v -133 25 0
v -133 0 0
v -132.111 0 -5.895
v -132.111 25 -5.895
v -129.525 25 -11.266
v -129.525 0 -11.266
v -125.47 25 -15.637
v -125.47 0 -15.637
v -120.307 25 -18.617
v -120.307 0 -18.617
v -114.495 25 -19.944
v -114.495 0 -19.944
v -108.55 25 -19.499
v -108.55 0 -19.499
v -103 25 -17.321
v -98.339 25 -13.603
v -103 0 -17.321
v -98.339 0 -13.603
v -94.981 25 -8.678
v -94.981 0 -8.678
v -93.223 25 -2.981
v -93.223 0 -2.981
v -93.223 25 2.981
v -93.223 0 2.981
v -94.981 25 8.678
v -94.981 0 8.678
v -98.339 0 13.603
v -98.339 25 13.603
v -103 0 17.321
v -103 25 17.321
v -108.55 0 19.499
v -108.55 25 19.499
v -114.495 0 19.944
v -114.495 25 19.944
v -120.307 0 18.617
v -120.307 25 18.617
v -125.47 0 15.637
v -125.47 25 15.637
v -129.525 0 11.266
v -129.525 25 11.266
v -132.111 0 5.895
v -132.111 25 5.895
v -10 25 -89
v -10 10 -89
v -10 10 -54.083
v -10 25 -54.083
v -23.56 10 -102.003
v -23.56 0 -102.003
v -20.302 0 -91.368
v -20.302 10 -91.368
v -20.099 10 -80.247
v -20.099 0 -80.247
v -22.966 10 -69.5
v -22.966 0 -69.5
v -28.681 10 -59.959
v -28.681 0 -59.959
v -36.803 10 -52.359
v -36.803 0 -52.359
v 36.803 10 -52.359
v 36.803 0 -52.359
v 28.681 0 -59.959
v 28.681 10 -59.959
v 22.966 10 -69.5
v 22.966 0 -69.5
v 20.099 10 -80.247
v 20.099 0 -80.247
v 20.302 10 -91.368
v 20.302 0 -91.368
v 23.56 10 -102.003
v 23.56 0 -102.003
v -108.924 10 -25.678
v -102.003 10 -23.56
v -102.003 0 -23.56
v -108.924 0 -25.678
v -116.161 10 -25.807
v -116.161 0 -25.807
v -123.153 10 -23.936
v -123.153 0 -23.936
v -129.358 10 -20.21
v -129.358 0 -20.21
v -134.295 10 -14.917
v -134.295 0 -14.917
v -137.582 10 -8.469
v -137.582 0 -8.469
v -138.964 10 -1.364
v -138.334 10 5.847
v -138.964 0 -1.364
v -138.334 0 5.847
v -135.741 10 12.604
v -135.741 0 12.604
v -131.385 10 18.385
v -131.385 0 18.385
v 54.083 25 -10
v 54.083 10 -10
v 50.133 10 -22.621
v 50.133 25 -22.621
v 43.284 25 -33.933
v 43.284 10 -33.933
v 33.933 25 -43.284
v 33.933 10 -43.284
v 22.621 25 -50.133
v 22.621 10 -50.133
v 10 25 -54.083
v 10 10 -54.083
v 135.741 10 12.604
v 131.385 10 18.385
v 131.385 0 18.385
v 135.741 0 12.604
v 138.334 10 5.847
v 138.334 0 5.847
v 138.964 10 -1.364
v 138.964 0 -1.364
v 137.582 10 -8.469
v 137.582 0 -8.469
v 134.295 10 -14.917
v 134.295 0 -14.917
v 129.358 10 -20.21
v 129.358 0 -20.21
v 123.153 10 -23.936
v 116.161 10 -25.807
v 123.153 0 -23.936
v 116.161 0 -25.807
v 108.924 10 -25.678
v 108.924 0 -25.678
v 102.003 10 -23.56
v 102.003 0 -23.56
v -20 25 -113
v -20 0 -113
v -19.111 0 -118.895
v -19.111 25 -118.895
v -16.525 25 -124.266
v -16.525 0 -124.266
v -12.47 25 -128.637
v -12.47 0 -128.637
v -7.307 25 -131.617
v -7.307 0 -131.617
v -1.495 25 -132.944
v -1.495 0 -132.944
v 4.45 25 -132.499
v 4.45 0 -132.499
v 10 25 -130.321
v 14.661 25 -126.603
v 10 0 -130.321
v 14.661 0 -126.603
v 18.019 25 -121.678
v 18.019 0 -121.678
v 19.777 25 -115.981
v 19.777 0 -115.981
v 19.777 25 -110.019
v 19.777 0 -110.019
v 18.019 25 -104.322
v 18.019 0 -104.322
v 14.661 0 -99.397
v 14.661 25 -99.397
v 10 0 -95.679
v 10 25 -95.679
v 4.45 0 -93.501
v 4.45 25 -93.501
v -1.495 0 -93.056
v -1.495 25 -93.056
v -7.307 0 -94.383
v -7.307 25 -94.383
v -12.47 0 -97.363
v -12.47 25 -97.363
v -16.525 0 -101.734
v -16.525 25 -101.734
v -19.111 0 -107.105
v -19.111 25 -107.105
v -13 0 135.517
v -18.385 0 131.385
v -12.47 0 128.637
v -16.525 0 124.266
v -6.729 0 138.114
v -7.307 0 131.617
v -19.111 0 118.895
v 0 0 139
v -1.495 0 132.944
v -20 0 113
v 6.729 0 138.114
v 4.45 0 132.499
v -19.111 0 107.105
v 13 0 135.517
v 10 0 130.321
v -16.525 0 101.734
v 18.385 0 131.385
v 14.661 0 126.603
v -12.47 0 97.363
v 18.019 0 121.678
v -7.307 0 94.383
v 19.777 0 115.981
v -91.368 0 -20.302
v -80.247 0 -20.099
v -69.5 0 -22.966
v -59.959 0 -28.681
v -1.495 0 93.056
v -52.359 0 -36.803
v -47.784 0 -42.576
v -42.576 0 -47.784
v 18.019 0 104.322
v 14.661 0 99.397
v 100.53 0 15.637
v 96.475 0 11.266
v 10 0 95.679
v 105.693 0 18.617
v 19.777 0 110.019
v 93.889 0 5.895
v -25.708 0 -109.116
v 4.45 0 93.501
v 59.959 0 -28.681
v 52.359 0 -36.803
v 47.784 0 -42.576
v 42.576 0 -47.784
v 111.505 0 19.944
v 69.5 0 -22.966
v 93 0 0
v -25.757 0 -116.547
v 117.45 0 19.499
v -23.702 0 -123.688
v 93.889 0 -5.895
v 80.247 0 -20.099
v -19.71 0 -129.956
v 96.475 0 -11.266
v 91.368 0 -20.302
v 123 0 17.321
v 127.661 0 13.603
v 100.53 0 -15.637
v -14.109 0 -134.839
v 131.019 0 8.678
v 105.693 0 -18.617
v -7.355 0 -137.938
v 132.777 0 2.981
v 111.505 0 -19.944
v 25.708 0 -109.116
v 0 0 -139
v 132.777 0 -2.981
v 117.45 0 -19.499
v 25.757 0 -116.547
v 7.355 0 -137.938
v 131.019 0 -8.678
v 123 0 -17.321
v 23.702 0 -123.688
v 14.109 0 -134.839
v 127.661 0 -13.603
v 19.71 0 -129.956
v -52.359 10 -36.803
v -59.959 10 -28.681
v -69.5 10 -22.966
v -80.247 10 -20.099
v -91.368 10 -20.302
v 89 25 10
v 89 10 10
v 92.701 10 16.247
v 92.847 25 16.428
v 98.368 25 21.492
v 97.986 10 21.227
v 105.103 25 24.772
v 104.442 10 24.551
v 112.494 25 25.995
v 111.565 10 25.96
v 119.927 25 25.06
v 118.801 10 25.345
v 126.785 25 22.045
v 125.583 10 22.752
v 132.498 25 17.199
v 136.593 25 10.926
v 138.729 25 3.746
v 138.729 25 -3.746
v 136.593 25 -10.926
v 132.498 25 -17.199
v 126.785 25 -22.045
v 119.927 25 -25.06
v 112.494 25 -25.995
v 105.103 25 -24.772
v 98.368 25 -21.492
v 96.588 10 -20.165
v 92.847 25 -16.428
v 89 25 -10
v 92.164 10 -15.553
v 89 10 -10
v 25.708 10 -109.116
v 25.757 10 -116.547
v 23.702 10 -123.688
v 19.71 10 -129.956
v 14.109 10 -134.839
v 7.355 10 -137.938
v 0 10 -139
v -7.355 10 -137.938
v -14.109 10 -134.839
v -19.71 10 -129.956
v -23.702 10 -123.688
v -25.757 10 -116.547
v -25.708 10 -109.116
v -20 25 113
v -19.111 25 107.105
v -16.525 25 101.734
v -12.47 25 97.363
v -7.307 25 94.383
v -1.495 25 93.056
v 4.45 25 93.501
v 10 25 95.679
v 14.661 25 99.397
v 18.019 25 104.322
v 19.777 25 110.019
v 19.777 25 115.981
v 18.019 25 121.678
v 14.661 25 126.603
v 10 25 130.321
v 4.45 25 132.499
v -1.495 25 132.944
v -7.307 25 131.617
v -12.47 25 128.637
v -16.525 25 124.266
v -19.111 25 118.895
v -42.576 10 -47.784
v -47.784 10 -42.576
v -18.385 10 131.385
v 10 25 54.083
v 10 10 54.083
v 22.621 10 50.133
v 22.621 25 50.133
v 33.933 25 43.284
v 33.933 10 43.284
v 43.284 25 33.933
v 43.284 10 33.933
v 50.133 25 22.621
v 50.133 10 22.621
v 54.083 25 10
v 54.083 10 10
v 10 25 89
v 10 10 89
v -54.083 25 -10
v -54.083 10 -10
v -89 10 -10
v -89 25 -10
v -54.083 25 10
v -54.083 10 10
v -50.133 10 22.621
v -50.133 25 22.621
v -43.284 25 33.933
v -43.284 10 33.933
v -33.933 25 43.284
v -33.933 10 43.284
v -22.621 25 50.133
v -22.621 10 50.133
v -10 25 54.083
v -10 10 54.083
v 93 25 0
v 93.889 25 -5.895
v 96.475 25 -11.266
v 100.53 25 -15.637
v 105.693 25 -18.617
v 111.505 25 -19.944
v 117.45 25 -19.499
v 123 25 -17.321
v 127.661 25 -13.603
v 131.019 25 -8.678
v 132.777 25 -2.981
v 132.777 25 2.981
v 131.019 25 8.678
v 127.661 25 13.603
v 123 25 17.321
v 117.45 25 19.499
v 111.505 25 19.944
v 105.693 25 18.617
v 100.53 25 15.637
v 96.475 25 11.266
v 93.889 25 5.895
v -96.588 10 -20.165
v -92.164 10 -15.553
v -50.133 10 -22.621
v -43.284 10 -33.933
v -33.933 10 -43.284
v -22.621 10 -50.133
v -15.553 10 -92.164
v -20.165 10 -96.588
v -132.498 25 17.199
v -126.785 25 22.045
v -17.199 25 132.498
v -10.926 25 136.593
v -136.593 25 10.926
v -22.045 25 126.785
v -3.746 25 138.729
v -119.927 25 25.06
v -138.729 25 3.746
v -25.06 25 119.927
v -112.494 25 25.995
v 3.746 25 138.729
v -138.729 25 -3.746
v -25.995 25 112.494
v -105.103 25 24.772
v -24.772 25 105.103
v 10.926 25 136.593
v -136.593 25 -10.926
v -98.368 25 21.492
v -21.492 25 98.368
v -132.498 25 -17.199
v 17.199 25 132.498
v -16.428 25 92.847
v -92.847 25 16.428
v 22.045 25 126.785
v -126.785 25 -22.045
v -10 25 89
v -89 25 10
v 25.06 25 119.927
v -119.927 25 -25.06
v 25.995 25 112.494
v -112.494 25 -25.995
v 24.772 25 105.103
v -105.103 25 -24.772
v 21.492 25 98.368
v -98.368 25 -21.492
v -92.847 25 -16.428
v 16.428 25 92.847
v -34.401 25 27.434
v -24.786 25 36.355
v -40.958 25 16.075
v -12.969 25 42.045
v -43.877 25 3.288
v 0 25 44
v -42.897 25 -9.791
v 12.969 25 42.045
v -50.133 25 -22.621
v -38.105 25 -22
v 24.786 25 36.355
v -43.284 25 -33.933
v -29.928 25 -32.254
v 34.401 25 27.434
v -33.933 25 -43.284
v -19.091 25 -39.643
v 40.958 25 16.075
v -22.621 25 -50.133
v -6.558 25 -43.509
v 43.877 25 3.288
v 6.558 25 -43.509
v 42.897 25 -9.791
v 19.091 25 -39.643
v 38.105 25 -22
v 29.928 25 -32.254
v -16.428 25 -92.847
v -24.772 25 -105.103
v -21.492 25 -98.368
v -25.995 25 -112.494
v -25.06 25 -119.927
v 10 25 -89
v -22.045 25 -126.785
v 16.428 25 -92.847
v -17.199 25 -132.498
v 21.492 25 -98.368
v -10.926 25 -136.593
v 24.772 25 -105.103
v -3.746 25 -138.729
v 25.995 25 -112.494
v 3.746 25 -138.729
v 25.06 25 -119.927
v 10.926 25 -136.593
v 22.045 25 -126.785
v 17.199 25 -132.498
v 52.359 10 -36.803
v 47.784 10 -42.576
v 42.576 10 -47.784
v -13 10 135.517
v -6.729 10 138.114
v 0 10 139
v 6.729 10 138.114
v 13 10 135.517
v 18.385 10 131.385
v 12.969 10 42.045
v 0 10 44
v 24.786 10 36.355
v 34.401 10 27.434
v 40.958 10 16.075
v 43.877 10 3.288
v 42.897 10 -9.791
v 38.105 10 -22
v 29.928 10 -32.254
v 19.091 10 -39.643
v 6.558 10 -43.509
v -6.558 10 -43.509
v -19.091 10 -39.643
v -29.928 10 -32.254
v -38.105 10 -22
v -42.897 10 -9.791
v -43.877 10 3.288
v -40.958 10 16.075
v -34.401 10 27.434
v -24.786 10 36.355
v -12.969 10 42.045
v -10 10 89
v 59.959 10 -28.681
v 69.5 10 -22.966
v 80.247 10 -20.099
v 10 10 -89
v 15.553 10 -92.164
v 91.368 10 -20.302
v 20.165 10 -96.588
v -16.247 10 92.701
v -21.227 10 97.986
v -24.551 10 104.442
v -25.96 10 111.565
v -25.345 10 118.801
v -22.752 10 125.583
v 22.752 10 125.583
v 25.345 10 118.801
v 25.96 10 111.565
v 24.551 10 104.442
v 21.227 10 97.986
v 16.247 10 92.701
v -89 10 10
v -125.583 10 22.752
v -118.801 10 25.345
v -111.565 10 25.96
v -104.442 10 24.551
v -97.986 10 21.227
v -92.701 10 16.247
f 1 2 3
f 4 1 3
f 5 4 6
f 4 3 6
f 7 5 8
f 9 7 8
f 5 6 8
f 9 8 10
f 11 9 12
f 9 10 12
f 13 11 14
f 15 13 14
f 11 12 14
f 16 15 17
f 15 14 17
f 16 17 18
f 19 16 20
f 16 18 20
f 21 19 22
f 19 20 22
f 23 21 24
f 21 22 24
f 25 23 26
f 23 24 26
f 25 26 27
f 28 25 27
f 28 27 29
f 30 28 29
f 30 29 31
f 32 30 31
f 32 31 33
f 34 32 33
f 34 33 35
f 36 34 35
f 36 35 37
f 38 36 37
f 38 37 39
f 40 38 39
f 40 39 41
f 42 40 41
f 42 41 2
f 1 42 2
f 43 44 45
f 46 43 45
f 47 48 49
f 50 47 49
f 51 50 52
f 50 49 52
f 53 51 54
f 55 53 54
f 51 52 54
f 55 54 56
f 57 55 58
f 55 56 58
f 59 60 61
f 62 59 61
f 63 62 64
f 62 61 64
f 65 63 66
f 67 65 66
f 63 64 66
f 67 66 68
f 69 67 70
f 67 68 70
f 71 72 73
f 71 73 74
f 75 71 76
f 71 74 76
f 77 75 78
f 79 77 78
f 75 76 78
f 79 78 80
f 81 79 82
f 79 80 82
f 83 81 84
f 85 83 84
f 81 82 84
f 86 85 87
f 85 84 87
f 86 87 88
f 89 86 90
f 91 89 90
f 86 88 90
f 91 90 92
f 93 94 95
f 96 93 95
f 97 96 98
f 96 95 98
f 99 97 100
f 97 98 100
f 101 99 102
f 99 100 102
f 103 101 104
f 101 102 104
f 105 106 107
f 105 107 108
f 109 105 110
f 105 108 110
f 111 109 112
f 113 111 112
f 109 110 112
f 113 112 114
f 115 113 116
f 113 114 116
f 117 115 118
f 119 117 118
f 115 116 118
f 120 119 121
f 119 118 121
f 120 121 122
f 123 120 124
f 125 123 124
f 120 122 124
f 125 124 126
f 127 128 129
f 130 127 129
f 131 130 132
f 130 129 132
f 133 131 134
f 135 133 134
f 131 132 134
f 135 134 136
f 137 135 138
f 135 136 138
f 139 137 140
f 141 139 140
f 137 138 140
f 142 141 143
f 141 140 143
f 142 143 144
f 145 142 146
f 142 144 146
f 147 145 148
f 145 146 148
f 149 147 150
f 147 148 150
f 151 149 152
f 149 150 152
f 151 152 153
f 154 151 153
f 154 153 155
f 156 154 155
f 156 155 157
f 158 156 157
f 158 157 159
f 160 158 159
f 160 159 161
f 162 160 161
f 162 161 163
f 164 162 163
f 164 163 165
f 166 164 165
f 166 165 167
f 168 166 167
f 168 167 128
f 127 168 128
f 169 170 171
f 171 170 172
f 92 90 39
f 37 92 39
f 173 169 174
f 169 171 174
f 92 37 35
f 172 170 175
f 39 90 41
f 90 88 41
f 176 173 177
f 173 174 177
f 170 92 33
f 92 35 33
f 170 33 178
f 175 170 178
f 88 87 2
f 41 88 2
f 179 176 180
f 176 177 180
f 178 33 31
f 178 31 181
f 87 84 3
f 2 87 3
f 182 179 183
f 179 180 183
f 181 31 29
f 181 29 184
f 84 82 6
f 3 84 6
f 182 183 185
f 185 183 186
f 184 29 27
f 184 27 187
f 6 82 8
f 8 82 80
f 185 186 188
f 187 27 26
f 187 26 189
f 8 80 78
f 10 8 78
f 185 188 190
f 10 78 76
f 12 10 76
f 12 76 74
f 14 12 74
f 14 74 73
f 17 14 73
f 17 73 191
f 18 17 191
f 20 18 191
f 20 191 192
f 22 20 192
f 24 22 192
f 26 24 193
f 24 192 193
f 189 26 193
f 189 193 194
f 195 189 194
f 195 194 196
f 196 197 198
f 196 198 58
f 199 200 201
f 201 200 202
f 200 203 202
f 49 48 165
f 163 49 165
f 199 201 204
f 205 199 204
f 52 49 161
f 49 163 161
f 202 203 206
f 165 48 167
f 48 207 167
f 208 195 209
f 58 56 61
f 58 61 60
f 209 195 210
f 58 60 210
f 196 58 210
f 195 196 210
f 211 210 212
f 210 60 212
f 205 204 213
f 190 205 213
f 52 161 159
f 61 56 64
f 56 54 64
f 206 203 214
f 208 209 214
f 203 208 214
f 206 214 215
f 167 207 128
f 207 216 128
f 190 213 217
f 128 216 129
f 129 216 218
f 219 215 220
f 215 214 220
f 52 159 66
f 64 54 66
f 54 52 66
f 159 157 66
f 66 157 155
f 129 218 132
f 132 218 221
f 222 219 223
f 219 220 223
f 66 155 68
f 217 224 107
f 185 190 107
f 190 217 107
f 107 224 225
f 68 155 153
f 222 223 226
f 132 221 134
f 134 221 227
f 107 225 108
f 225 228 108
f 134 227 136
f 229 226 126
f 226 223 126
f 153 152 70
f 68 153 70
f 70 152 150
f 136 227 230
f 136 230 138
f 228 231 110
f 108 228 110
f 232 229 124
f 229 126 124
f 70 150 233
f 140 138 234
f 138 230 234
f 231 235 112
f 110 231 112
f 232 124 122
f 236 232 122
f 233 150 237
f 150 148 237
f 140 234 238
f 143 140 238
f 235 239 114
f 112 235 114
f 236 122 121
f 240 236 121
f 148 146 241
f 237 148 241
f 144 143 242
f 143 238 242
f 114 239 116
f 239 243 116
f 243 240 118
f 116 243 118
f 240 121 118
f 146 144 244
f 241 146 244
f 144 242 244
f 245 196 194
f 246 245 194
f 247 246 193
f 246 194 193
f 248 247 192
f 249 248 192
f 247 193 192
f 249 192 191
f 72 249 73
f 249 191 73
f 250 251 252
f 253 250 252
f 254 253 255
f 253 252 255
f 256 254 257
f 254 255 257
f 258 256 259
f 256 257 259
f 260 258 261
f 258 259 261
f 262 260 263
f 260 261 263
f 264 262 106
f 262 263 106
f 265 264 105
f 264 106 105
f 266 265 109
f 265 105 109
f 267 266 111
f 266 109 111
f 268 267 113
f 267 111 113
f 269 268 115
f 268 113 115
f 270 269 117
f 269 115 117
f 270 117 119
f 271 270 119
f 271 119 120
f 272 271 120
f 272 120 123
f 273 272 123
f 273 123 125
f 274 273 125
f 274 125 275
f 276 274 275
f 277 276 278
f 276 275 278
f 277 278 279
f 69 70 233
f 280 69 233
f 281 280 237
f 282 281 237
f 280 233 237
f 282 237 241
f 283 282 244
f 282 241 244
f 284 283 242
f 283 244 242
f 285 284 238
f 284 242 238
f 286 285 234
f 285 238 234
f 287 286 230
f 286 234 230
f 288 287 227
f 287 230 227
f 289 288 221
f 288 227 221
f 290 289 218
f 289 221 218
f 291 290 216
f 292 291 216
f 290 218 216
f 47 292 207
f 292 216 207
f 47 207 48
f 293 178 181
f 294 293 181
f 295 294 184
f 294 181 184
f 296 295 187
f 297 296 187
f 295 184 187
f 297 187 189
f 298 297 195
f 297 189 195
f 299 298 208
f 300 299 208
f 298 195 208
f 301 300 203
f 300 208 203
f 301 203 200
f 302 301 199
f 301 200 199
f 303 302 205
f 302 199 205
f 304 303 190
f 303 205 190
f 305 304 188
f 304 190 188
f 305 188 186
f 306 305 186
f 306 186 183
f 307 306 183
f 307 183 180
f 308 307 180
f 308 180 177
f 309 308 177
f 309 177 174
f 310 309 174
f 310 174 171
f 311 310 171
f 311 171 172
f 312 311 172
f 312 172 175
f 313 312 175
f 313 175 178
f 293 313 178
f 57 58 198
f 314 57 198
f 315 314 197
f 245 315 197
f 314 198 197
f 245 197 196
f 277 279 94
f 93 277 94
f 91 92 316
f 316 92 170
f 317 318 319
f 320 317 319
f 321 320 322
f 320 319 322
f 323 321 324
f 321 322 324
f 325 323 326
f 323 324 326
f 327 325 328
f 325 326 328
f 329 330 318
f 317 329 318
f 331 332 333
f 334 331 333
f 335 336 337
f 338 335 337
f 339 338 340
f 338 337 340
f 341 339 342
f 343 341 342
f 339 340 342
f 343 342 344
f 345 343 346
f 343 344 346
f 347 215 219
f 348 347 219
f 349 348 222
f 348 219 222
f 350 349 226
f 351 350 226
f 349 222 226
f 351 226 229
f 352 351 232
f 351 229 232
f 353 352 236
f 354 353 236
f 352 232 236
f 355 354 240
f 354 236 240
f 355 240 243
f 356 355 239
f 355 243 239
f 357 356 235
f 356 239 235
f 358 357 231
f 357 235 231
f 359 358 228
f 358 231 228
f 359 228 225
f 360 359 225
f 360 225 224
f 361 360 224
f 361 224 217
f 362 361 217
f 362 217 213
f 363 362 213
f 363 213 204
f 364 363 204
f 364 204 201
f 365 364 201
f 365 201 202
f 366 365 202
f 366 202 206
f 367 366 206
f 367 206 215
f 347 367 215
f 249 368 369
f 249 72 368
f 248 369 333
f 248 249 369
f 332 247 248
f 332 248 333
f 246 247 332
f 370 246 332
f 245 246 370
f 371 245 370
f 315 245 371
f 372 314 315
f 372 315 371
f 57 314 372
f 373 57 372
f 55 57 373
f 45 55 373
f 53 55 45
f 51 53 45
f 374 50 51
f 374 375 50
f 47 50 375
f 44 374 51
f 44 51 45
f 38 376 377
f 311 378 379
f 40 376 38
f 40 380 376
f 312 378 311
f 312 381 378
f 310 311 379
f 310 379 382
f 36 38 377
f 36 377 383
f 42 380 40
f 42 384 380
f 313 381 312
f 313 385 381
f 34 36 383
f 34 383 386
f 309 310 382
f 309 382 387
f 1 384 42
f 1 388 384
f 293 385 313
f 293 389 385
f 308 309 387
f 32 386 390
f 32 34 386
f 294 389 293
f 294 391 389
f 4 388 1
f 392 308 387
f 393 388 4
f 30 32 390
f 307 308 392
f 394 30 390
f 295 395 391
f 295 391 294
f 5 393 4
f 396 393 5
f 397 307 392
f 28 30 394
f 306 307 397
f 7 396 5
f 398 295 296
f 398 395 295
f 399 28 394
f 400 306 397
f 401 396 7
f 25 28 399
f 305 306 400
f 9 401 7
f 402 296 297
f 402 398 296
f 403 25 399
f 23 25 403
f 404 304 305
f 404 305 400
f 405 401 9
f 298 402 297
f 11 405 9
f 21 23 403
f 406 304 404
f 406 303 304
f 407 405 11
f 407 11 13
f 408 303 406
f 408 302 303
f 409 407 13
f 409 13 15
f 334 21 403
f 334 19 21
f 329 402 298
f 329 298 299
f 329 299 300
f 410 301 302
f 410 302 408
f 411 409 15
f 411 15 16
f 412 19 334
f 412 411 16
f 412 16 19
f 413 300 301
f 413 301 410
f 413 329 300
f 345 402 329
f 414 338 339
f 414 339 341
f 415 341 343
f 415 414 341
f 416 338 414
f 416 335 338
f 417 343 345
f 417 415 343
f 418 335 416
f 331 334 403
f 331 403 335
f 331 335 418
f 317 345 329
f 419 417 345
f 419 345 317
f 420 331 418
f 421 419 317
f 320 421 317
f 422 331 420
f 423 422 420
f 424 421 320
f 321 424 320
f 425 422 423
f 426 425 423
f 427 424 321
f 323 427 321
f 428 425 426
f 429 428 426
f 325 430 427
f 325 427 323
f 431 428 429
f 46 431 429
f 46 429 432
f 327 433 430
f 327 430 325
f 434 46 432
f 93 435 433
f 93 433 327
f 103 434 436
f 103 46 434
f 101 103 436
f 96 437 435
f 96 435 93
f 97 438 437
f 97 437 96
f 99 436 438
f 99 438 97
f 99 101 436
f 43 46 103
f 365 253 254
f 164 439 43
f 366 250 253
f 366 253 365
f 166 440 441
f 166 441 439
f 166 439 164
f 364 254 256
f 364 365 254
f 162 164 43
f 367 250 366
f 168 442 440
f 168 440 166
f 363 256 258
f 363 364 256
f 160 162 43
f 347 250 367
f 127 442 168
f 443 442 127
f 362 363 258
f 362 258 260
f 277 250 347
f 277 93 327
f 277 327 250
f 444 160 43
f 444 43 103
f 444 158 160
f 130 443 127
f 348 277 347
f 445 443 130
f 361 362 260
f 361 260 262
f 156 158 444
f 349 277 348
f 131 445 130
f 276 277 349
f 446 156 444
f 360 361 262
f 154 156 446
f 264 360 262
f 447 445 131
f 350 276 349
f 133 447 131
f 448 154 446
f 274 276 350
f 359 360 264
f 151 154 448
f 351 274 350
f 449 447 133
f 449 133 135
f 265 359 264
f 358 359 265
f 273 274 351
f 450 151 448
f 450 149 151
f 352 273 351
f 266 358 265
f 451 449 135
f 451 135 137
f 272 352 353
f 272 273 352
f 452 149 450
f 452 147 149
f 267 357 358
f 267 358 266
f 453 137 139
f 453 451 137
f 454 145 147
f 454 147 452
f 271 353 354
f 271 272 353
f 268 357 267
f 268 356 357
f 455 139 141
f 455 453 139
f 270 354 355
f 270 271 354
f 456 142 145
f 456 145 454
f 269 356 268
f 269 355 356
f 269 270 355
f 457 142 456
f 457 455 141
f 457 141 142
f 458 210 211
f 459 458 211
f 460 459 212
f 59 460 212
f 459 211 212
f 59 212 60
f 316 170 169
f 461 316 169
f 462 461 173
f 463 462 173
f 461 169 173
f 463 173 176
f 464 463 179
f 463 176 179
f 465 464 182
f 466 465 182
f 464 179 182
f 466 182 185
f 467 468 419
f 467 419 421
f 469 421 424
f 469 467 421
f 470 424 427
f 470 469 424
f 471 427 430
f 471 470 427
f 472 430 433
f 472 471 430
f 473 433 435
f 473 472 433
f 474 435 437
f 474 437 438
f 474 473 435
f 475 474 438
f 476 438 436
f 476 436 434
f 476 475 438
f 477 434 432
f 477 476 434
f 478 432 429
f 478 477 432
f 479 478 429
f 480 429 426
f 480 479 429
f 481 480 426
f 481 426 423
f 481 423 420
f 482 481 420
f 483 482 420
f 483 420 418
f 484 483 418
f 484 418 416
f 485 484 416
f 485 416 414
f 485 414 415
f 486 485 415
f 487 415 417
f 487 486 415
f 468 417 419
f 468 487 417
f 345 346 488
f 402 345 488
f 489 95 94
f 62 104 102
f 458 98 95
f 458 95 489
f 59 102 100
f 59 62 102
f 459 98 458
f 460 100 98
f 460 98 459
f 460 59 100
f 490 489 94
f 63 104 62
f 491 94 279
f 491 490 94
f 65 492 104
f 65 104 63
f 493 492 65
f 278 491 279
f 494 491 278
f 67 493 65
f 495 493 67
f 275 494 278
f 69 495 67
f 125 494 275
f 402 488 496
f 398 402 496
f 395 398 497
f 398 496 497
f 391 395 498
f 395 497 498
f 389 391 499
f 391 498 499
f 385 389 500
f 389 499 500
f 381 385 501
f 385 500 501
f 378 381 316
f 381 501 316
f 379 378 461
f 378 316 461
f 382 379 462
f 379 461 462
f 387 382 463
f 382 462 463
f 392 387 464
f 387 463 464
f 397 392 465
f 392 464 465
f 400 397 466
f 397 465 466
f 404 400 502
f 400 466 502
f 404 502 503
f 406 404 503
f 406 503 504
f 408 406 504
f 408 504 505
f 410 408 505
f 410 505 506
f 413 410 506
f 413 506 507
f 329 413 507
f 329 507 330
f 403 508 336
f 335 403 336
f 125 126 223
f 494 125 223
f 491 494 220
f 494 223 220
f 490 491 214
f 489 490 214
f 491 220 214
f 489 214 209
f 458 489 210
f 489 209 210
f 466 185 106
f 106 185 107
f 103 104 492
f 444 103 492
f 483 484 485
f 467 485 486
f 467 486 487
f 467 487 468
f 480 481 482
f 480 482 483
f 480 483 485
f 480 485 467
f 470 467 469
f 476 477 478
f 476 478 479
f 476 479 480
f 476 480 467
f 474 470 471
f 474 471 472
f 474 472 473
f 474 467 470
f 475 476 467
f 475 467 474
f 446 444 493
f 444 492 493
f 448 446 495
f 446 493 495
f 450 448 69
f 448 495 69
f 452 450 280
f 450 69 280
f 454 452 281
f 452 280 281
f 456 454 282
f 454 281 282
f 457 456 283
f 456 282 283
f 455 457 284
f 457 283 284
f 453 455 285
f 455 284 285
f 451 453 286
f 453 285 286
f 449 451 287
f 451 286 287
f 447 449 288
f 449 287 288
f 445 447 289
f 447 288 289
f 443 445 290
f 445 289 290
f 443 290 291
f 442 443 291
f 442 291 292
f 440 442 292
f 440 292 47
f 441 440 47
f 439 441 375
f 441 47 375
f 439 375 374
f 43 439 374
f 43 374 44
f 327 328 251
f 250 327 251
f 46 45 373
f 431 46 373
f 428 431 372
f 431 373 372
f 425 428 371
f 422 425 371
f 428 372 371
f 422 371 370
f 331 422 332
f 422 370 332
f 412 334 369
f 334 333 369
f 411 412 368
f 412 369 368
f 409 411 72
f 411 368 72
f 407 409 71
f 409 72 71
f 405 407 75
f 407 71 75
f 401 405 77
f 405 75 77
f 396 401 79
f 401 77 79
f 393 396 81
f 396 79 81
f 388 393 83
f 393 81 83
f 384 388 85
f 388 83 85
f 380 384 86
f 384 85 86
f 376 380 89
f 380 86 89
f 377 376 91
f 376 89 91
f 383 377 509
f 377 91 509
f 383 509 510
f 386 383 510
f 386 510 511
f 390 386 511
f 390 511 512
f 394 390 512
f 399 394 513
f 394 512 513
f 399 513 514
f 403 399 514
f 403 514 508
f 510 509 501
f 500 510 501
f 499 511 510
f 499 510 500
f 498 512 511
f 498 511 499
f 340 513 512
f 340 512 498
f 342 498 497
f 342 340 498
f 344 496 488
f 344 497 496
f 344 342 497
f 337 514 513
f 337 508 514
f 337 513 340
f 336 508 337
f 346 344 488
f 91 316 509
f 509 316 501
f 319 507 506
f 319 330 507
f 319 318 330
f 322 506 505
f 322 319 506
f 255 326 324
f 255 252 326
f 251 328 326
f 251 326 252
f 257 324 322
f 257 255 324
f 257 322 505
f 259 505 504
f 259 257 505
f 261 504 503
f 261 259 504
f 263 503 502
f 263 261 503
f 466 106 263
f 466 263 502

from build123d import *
from build123d.topology import SkipClean

# Parameters (mm, degrees)
BOSS_EXTRUDE1_DEPTH   = 10
SKETCH2_R             = 26
BOSS_EXTRUDE2_DEPTH   = 15
SKETCH3_R             = 55
SKETCH3_R_2           = 44
BOSS_EXTRUDE3_DEPTH   = 15
EXTRUDE_THIN1_START   = -15
EXTRUDE_THIN1_DEPTH   = 15
EXTRUDE_THIN2_START   = -15
EXTRUDE_THIN2_DEPTH   = 15
F_1_0MM_DOWEL_HOLE1_D = 40


# Read off the part's stored shape, not the designer's step: Extrude-Thin1, Extrude-Thin2
with BuildPart() as part:
    # Sketch1 → Boss-Extrude1 (new body)
    with BuildSketch(Plane(origin=(0, 0, 0), x_dir=(1, 0, 0), z_dir=(0, 1, 0))):
        with BuildLine():
            Line((18.384776311, -131.384776311), (131.384776311, -18.384776311))
            ThreePointArc((131.384776311, -18.384776311), (134.295069945, 14.917104144), (102.002815768, 23.559752524))
            ThreePointArc((102.002815768, 23.559752524), (74.773631801, 21.15717706), (52.359428182, 36.803400392))
            ThreePointArc((52.359428182, 36.803400392), (45.254833996, 45.254833996), (36.803400392, 52.359428182))
            ThreePointArc((36.803400392, 52.359428182), (21.15717706, 74.773631801), (23.559752524, 102.002815768))
            ThreePointArc((23.559752524, 102.002815768), (0, 139), (-23.559752524, 102.002815768))
            ThreePointArc((-23.559752524, 102.002815768), (-21.15717706, 74.773631801), (-36.803400392, 52.359428182))
            ThreePointArc((-36.803400392, 52.359428182), (-45.254833996, 45.254833996), (-52.359428182, 36.803400392))
            ThreePointArc((-52.359428182, 36.803400392), (-74.773631801, 21.15717706), (-102.002815768, 23.559752524))
            ThreePointArc((-102.002815768, 23.559752524), (-134.295069945, 14.917104144), (-131.384776311, -18.384776311))
            Line((-131.384776311, -18.384776311), (-18.384776311, -131.384776311))
            ThreePointArc((-18.384776311, -131.384776311), (0, -139), (18.384776311, -131.384776311))
        make_face()
    extrude(amount=BOSS_EXTRUDE1_DEPTH)

    # Sketch2 → Boss-Extrude2 (add)
    with BuildSketch(Plane(origin=(0, 10, 0), x_dir=(1, 0, 0), z_dir=(0, 1, 0))):
        with Locations(Location((0, 113, 0), (0, 0, 205.022151532))):
            Circle(SKETCH2_R)
        with Locations(Location((113, 0, 0), (0, 0, 115.022151532))):
            Circle(SKETCH2_R)
        with Locations(Location((-113, 0, 0), (0, 0, 64.977848468))):
            Circle(SKETCH2_R)
        with Locations(Location((0, -113, 0), (0, 0, 315))):
            Circle(SKETCH2_R)
    extrude(amount=BOSS_EXTRUDE2_DEPTH)

    # Sketch3 → Boss-Extrude3 (add)
    with BuildSketch(Plane(origin=(0, 10, 0), x_dir=(1, 0, 0), z_dir=(0, 1, 0))):
        with Locations(Location((0, 0, 0), (0, 0, 270))):
            Circle(SKETCH3_R)
        with Locations(Location((0, 0, 0), (0, 0, 270))):
            Circle(SKETCH3_R_2, mode=Mode.SUBTRACT)
    extrude(amount=BOSS_EXTRUDE3_DEPTH)

    # Extrude-Thin1 outline → Extrude-Thin1 (add)
    with SkipClean():  # the faces are left unmerged after this step: merging them gives an invalid solid
        with BuildSketch(Plane(origin=(0, 25, 0), x_dir=(1, 0, 0), z_dir=(0, 1, 0)).offset(EXTRUDE_THIN1_START)):
            with BuildLine():
                Line((-89, -10), (-54.083269132, -10))
                ThreePointArc((-54.083269132, -10), (-54.770337785, -5.02096593), (-55, 0))
                Line((-55, 0), (-87, 0))
                ThreePointArc((-87, 0), (-87.504902432, -5.099019514), (-89, -10))
            make_face()
            with BuildLine():
                ThreePointArc((10, -54.083269132), (0, -55), (-10, -54.083269132))
                Line((-10, -54.083269132), (-10, -89))
                ThreePointArc((-10, -89), (0, -87), (10, -89))
                Line((10, -89), (10, -54.083269132))
            make_face()
            with BuildLine():
                Line((87, 0), (55, 0))
                ThreePointArc((55, 0), (54.770337785, -5.02096593), (54.083269132, -10))
                Line((54.083269132, -10), (89, -10))
                ThreePointArc((89, -10), (87.504902432, -5.099019514), (87, 0))
            make_face()
        extrude(amount=EXTRUDE_THIN1_DEPTH)

    # Extrude-Thin2 outline → Extrude-Thin2 (add)
    with SkipClean():  # the faces are left unmerged after this step: merging them gives an invalid solid
        with BuildSketch(Plane(origin=(0, 25, 0), x_dir=(1, 0, 0), z_dir=(0, 1, 0)).offset(EXTRUDE_THIN2_START)):
            with BuildLine():
                Line((89, 10), (54.083269132, 10))
                ThreePointArc((54.083269132, 10), (54.770337785, 5.02096593), (55, 0))
                Line((55, 0), (87, 0))
                ThreePointArc((87, 0), (87.504902432, 5.099019514), (89, 10))
            make_face()
            with BuildLine():
                ThreePointArc((-55, 0), (-54.770337785, 5.02096593), (-54.083269132, 10))
                Line((-54.083269132, 10), (-89, 10))
                ThreePointArc((-89, 10), (-87.504902432, 5.099019514), (-87, 0))
                Line((-87, 0), (-55, 0))
            make_face()
            with BuildLine():
                Line((-10, 89), (-10, 54.083269132))
                ThreePointArc((-10, 54.083269132), (0, 55), (10, 54.083269132))
                Line((10, 54.083269132), (10, 89))
                ThreePointArc((10, 89), (0, 87), (-10, 89))
            make_face()
        extrude(amount=EXTRUDE_THIN2_DEPTH)

    # Ø1.0mm Dowel Hole1 (through all)
    with Locations(Plane(origin=(0, 25, 0), x_dir=(1, 0, 0), z_dir=(0, 1, 0))):
        with Locations((0, 113), (-113, 0), (113, 0), (0, -113)):
            Hole(F_1_0MM_DOWEL_HOLE1_D / 2)


solid = part.part
